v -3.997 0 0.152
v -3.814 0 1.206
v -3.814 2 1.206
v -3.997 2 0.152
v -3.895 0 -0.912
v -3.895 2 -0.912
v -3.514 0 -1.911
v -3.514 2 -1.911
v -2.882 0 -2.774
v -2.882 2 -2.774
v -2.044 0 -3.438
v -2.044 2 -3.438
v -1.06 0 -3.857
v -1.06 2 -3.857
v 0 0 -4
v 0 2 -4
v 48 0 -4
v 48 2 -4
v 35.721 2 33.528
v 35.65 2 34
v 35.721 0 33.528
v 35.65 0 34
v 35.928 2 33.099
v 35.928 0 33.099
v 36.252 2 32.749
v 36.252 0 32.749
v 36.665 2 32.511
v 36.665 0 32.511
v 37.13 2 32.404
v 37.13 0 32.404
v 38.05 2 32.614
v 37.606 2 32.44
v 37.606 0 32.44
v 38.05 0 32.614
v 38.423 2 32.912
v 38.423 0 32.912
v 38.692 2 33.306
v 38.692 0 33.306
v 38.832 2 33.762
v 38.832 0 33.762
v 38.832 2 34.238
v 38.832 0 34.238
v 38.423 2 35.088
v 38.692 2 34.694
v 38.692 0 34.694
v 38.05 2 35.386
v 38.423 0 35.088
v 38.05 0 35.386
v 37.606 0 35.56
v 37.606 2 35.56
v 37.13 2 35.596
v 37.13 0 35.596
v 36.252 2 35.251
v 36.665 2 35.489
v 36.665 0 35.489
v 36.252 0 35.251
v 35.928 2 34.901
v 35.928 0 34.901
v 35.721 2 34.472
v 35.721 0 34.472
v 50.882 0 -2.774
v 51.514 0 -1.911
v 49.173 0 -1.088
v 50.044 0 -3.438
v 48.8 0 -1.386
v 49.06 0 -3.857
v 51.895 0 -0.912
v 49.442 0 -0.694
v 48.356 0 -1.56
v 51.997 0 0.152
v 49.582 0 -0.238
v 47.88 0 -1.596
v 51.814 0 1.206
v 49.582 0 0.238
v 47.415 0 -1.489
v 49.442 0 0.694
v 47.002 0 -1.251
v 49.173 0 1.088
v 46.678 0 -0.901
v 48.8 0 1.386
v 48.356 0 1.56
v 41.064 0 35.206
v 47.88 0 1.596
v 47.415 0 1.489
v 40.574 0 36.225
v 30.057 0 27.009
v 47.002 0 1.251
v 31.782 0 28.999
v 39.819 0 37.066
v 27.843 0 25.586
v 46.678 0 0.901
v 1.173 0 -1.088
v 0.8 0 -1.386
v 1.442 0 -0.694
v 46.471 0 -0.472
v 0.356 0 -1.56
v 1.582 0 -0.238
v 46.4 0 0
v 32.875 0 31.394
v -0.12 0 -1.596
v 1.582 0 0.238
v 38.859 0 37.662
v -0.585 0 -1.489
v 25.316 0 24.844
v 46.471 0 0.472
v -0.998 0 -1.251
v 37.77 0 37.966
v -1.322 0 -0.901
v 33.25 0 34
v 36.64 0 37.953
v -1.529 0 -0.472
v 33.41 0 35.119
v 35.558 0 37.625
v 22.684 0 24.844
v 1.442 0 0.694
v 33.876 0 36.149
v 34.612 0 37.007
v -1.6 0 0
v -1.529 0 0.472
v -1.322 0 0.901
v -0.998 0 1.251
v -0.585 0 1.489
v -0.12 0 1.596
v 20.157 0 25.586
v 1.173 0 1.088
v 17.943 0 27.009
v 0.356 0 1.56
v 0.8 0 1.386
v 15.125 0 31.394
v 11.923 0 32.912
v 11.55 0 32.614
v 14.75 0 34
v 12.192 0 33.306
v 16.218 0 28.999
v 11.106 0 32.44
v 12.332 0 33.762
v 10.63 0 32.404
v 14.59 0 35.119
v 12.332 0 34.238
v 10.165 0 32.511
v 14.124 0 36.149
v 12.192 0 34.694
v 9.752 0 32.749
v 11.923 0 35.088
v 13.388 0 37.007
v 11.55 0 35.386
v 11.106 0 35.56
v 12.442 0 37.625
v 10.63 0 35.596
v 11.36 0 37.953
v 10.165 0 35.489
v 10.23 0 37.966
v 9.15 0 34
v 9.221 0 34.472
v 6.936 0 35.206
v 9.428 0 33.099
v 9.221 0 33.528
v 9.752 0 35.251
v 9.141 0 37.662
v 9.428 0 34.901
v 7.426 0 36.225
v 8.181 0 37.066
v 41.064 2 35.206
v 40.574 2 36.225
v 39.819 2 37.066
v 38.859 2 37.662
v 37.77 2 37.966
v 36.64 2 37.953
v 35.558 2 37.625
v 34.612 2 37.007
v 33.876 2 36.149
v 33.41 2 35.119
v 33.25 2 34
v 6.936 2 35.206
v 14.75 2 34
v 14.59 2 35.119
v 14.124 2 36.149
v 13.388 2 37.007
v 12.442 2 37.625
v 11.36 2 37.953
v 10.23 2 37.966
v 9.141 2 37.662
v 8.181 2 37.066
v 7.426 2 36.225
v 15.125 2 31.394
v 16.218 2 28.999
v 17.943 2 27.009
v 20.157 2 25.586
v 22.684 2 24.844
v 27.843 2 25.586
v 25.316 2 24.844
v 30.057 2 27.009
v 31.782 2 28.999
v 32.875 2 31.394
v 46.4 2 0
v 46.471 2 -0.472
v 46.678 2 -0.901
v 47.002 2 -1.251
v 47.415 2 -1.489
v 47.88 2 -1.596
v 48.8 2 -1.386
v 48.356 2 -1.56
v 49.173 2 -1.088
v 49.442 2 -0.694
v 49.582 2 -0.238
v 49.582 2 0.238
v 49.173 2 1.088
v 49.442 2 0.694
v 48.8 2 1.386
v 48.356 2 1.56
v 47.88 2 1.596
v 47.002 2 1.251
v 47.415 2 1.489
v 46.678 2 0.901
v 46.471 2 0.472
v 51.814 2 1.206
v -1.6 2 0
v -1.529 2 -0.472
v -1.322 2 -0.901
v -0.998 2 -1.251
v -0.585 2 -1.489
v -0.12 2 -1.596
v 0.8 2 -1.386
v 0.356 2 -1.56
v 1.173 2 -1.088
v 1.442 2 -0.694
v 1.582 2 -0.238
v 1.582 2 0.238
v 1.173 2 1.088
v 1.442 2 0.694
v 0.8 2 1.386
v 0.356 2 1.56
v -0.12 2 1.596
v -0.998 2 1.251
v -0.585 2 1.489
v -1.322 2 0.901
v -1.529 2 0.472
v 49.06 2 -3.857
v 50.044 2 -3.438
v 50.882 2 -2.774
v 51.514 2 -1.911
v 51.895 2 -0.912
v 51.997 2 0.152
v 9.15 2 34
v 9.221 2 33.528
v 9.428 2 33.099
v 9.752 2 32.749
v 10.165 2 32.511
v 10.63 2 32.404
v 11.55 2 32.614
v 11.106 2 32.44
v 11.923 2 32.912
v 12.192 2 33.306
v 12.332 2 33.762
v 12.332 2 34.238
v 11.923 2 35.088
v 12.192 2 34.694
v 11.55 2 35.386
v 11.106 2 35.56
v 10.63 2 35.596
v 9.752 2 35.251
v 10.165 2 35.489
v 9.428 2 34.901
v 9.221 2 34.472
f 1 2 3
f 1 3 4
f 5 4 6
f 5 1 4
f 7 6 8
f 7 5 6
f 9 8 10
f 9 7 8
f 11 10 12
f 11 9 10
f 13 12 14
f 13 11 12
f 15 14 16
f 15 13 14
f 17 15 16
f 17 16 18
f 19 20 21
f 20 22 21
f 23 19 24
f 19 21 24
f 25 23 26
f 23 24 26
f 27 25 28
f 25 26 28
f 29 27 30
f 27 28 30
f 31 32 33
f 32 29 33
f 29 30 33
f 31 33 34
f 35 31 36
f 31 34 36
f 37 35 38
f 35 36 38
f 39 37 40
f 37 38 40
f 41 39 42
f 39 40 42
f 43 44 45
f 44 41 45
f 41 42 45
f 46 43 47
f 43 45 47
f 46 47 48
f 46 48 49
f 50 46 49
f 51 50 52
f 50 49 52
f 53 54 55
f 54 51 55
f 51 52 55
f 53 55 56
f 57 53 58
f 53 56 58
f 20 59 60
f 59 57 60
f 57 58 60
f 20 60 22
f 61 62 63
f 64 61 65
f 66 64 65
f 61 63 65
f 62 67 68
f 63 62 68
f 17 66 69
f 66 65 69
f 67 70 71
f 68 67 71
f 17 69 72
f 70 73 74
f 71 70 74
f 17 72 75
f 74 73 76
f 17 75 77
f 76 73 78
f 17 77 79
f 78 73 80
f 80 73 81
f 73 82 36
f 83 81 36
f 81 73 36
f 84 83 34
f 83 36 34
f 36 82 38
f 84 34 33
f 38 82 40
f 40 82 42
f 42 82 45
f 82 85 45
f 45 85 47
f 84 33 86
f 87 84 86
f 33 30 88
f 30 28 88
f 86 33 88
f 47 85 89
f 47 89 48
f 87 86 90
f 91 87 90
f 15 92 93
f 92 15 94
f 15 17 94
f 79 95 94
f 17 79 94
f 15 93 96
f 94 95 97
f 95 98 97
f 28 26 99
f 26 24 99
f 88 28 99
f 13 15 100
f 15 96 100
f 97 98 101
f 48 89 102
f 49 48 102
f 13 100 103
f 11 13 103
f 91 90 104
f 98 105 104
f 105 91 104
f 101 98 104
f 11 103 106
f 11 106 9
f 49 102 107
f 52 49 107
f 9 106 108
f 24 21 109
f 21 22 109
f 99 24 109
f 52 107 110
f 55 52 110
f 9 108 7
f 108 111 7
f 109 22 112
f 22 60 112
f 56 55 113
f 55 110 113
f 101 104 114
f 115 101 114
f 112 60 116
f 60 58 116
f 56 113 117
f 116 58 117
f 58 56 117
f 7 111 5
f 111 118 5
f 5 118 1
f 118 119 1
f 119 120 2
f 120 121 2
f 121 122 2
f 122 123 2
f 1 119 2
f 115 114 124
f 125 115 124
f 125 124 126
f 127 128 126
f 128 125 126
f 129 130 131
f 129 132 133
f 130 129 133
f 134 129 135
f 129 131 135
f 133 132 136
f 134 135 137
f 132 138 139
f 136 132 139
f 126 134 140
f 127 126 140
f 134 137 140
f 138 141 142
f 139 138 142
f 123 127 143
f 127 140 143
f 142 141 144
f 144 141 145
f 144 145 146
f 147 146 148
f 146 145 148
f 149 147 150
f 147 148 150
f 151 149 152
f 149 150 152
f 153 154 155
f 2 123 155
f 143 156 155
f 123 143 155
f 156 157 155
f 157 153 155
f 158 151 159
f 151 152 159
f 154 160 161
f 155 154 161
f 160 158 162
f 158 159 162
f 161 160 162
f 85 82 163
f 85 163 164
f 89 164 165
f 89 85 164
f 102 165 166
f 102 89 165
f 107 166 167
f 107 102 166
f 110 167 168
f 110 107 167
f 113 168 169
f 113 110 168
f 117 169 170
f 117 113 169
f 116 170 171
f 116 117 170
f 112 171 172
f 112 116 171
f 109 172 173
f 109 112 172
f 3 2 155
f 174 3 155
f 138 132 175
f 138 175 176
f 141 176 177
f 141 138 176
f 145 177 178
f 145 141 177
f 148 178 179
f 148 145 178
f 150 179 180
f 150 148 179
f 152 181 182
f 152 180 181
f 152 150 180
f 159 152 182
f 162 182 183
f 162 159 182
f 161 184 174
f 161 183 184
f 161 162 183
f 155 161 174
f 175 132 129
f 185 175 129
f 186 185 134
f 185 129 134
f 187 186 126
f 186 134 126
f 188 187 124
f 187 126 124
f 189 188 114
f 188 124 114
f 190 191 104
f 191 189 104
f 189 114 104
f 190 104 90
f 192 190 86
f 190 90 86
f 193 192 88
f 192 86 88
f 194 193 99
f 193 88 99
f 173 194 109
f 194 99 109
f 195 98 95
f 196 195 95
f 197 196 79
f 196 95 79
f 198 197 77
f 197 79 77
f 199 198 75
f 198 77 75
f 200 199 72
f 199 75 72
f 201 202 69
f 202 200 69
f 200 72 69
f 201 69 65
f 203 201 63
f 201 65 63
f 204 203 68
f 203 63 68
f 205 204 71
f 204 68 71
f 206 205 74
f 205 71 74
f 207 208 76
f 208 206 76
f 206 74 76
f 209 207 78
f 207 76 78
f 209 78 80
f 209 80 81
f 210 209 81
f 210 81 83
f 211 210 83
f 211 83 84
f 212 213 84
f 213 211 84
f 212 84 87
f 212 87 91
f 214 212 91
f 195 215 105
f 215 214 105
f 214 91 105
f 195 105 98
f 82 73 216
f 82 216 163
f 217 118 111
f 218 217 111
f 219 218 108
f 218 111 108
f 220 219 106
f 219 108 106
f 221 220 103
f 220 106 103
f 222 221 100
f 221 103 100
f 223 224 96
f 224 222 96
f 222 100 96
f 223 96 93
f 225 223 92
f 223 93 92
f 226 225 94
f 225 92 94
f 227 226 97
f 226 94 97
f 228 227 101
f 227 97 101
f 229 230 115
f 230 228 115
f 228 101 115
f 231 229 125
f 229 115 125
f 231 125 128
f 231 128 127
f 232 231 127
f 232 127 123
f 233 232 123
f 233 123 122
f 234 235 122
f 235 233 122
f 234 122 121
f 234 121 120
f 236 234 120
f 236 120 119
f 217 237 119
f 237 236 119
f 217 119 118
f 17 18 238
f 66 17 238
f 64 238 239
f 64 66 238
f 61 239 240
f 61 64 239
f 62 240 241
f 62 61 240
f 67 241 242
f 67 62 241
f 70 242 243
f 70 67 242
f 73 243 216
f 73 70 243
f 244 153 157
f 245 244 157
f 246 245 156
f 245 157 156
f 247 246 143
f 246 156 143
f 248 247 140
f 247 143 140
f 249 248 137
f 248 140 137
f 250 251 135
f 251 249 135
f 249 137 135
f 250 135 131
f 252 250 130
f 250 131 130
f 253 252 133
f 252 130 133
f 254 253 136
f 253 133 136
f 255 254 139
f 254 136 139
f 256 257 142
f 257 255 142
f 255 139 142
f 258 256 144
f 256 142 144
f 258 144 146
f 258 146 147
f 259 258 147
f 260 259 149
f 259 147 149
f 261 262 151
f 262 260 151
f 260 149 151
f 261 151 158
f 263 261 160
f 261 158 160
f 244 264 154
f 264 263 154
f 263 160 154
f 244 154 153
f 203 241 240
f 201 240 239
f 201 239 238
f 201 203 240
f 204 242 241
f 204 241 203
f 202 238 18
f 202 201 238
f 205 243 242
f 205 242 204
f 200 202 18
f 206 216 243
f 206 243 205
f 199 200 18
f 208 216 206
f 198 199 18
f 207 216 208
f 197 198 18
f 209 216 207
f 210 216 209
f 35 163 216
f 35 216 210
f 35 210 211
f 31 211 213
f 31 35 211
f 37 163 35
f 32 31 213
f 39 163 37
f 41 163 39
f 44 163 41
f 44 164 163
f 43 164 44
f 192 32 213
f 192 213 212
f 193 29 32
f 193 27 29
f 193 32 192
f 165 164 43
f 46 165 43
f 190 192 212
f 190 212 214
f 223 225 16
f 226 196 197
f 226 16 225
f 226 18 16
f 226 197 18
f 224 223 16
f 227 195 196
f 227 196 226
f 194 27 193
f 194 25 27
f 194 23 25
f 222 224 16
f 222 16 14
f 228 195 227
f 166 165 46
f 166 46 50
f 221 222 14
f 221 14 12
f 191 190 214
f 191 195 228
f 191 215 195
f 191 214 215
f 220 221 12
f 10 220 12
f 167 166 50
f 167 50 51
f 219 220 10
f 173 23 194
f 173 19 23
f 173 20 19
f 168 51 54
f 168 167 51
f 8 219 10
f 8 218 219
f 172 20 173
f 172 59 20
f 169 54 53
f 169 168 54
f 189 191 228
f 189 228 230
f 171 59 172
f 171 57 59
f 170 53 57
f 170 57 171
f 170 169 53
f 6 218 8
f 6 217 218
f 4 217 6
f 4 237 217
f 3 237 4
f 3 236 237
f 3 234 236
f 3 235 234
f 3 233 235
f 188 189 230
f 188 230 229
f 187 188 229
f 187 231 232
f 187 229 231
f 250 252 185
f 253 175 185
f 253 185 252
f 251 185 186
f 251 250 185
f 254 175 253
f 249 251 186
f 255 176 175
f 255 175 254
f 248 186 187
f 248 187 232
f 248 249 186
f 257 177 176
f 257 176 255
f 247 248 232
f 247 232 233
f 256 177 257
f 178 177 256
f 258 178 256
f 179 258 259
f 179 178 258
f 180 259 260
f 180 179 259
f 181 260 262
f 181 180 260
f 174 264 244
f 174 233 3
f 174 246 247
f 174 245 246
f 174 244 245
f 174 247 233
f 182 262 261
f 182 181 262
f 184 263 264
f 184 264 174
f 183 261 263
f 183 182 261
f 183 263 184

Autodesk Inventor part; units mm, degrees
ref_plane "YZ Plane" through (0, 0, 0) normal (1, 0, 0) x (0, 1, 0)
ref_plane "XZ Plane" through (0, 0, 0) normal (0, 1, 0) x (-1, 0, 0)
ref_plane "XY Plane" through (0, 0, 0) normal (0, 0, 1) x (1, 0, 0)
sketch "Sketch1" plane through (0, 0, 0) normal (0, 1, 0) x (-1, 0, 0)
  line L0 (0, 0) -> (-48, 0) construction
  line L1 (-24, 0) -> (-24, 34) construction
  line L2 (-24, 34) -> (-37.25, 34) construction
  line L3 (-24, 34) -> (-10.75, 34) construction
  circle A0 centre (-48, 0) radius 1.6
  circle A1 centre (-37.25, 34) radius 1.6
  circle A2 centre (0, 0) radius 1.6
  circle A3 centre (-10.75, 34) radius 1.6
  arc A4 (-51.8139, 1.2059) -> (-48, -4) centre (-48, 0) ccw
  arc A5 (-33.25, 34) -> (-41.0639, 35.2059) centre (-37.25, 34) ccw
  arc A6 (0, -4) -> (3.8139, 1.2059) centre (0, 0) ccw
  arc A7 (-6.9361, 35.2059) -> (-14.75, 34) centre (-10.75, 34) ccw
  arc A8 (-33.25, 34) -> (-14.75, 34) centre (-24, 34) ccw
  line L4 (0, -4) -> (-48, -4)
  line L5 (-51.8139, 1.2059) -> (-41.0639, 35.2059)
  line L6 (3.8139, 1.2059) -> (-6.9361, 35.2059)
  dimension "d0" = 48
  dimension "d1" = 34
  dimension "d2" = 13.25
  dimension "d3" = 3.2
  dimension "d4" = 3.2
  dimension "d5" = 8
  dimension "d6" = 8
extrude "Extrusion1" add sketch "Sketch1" along normal blind 2
properties part number "front mount base"
